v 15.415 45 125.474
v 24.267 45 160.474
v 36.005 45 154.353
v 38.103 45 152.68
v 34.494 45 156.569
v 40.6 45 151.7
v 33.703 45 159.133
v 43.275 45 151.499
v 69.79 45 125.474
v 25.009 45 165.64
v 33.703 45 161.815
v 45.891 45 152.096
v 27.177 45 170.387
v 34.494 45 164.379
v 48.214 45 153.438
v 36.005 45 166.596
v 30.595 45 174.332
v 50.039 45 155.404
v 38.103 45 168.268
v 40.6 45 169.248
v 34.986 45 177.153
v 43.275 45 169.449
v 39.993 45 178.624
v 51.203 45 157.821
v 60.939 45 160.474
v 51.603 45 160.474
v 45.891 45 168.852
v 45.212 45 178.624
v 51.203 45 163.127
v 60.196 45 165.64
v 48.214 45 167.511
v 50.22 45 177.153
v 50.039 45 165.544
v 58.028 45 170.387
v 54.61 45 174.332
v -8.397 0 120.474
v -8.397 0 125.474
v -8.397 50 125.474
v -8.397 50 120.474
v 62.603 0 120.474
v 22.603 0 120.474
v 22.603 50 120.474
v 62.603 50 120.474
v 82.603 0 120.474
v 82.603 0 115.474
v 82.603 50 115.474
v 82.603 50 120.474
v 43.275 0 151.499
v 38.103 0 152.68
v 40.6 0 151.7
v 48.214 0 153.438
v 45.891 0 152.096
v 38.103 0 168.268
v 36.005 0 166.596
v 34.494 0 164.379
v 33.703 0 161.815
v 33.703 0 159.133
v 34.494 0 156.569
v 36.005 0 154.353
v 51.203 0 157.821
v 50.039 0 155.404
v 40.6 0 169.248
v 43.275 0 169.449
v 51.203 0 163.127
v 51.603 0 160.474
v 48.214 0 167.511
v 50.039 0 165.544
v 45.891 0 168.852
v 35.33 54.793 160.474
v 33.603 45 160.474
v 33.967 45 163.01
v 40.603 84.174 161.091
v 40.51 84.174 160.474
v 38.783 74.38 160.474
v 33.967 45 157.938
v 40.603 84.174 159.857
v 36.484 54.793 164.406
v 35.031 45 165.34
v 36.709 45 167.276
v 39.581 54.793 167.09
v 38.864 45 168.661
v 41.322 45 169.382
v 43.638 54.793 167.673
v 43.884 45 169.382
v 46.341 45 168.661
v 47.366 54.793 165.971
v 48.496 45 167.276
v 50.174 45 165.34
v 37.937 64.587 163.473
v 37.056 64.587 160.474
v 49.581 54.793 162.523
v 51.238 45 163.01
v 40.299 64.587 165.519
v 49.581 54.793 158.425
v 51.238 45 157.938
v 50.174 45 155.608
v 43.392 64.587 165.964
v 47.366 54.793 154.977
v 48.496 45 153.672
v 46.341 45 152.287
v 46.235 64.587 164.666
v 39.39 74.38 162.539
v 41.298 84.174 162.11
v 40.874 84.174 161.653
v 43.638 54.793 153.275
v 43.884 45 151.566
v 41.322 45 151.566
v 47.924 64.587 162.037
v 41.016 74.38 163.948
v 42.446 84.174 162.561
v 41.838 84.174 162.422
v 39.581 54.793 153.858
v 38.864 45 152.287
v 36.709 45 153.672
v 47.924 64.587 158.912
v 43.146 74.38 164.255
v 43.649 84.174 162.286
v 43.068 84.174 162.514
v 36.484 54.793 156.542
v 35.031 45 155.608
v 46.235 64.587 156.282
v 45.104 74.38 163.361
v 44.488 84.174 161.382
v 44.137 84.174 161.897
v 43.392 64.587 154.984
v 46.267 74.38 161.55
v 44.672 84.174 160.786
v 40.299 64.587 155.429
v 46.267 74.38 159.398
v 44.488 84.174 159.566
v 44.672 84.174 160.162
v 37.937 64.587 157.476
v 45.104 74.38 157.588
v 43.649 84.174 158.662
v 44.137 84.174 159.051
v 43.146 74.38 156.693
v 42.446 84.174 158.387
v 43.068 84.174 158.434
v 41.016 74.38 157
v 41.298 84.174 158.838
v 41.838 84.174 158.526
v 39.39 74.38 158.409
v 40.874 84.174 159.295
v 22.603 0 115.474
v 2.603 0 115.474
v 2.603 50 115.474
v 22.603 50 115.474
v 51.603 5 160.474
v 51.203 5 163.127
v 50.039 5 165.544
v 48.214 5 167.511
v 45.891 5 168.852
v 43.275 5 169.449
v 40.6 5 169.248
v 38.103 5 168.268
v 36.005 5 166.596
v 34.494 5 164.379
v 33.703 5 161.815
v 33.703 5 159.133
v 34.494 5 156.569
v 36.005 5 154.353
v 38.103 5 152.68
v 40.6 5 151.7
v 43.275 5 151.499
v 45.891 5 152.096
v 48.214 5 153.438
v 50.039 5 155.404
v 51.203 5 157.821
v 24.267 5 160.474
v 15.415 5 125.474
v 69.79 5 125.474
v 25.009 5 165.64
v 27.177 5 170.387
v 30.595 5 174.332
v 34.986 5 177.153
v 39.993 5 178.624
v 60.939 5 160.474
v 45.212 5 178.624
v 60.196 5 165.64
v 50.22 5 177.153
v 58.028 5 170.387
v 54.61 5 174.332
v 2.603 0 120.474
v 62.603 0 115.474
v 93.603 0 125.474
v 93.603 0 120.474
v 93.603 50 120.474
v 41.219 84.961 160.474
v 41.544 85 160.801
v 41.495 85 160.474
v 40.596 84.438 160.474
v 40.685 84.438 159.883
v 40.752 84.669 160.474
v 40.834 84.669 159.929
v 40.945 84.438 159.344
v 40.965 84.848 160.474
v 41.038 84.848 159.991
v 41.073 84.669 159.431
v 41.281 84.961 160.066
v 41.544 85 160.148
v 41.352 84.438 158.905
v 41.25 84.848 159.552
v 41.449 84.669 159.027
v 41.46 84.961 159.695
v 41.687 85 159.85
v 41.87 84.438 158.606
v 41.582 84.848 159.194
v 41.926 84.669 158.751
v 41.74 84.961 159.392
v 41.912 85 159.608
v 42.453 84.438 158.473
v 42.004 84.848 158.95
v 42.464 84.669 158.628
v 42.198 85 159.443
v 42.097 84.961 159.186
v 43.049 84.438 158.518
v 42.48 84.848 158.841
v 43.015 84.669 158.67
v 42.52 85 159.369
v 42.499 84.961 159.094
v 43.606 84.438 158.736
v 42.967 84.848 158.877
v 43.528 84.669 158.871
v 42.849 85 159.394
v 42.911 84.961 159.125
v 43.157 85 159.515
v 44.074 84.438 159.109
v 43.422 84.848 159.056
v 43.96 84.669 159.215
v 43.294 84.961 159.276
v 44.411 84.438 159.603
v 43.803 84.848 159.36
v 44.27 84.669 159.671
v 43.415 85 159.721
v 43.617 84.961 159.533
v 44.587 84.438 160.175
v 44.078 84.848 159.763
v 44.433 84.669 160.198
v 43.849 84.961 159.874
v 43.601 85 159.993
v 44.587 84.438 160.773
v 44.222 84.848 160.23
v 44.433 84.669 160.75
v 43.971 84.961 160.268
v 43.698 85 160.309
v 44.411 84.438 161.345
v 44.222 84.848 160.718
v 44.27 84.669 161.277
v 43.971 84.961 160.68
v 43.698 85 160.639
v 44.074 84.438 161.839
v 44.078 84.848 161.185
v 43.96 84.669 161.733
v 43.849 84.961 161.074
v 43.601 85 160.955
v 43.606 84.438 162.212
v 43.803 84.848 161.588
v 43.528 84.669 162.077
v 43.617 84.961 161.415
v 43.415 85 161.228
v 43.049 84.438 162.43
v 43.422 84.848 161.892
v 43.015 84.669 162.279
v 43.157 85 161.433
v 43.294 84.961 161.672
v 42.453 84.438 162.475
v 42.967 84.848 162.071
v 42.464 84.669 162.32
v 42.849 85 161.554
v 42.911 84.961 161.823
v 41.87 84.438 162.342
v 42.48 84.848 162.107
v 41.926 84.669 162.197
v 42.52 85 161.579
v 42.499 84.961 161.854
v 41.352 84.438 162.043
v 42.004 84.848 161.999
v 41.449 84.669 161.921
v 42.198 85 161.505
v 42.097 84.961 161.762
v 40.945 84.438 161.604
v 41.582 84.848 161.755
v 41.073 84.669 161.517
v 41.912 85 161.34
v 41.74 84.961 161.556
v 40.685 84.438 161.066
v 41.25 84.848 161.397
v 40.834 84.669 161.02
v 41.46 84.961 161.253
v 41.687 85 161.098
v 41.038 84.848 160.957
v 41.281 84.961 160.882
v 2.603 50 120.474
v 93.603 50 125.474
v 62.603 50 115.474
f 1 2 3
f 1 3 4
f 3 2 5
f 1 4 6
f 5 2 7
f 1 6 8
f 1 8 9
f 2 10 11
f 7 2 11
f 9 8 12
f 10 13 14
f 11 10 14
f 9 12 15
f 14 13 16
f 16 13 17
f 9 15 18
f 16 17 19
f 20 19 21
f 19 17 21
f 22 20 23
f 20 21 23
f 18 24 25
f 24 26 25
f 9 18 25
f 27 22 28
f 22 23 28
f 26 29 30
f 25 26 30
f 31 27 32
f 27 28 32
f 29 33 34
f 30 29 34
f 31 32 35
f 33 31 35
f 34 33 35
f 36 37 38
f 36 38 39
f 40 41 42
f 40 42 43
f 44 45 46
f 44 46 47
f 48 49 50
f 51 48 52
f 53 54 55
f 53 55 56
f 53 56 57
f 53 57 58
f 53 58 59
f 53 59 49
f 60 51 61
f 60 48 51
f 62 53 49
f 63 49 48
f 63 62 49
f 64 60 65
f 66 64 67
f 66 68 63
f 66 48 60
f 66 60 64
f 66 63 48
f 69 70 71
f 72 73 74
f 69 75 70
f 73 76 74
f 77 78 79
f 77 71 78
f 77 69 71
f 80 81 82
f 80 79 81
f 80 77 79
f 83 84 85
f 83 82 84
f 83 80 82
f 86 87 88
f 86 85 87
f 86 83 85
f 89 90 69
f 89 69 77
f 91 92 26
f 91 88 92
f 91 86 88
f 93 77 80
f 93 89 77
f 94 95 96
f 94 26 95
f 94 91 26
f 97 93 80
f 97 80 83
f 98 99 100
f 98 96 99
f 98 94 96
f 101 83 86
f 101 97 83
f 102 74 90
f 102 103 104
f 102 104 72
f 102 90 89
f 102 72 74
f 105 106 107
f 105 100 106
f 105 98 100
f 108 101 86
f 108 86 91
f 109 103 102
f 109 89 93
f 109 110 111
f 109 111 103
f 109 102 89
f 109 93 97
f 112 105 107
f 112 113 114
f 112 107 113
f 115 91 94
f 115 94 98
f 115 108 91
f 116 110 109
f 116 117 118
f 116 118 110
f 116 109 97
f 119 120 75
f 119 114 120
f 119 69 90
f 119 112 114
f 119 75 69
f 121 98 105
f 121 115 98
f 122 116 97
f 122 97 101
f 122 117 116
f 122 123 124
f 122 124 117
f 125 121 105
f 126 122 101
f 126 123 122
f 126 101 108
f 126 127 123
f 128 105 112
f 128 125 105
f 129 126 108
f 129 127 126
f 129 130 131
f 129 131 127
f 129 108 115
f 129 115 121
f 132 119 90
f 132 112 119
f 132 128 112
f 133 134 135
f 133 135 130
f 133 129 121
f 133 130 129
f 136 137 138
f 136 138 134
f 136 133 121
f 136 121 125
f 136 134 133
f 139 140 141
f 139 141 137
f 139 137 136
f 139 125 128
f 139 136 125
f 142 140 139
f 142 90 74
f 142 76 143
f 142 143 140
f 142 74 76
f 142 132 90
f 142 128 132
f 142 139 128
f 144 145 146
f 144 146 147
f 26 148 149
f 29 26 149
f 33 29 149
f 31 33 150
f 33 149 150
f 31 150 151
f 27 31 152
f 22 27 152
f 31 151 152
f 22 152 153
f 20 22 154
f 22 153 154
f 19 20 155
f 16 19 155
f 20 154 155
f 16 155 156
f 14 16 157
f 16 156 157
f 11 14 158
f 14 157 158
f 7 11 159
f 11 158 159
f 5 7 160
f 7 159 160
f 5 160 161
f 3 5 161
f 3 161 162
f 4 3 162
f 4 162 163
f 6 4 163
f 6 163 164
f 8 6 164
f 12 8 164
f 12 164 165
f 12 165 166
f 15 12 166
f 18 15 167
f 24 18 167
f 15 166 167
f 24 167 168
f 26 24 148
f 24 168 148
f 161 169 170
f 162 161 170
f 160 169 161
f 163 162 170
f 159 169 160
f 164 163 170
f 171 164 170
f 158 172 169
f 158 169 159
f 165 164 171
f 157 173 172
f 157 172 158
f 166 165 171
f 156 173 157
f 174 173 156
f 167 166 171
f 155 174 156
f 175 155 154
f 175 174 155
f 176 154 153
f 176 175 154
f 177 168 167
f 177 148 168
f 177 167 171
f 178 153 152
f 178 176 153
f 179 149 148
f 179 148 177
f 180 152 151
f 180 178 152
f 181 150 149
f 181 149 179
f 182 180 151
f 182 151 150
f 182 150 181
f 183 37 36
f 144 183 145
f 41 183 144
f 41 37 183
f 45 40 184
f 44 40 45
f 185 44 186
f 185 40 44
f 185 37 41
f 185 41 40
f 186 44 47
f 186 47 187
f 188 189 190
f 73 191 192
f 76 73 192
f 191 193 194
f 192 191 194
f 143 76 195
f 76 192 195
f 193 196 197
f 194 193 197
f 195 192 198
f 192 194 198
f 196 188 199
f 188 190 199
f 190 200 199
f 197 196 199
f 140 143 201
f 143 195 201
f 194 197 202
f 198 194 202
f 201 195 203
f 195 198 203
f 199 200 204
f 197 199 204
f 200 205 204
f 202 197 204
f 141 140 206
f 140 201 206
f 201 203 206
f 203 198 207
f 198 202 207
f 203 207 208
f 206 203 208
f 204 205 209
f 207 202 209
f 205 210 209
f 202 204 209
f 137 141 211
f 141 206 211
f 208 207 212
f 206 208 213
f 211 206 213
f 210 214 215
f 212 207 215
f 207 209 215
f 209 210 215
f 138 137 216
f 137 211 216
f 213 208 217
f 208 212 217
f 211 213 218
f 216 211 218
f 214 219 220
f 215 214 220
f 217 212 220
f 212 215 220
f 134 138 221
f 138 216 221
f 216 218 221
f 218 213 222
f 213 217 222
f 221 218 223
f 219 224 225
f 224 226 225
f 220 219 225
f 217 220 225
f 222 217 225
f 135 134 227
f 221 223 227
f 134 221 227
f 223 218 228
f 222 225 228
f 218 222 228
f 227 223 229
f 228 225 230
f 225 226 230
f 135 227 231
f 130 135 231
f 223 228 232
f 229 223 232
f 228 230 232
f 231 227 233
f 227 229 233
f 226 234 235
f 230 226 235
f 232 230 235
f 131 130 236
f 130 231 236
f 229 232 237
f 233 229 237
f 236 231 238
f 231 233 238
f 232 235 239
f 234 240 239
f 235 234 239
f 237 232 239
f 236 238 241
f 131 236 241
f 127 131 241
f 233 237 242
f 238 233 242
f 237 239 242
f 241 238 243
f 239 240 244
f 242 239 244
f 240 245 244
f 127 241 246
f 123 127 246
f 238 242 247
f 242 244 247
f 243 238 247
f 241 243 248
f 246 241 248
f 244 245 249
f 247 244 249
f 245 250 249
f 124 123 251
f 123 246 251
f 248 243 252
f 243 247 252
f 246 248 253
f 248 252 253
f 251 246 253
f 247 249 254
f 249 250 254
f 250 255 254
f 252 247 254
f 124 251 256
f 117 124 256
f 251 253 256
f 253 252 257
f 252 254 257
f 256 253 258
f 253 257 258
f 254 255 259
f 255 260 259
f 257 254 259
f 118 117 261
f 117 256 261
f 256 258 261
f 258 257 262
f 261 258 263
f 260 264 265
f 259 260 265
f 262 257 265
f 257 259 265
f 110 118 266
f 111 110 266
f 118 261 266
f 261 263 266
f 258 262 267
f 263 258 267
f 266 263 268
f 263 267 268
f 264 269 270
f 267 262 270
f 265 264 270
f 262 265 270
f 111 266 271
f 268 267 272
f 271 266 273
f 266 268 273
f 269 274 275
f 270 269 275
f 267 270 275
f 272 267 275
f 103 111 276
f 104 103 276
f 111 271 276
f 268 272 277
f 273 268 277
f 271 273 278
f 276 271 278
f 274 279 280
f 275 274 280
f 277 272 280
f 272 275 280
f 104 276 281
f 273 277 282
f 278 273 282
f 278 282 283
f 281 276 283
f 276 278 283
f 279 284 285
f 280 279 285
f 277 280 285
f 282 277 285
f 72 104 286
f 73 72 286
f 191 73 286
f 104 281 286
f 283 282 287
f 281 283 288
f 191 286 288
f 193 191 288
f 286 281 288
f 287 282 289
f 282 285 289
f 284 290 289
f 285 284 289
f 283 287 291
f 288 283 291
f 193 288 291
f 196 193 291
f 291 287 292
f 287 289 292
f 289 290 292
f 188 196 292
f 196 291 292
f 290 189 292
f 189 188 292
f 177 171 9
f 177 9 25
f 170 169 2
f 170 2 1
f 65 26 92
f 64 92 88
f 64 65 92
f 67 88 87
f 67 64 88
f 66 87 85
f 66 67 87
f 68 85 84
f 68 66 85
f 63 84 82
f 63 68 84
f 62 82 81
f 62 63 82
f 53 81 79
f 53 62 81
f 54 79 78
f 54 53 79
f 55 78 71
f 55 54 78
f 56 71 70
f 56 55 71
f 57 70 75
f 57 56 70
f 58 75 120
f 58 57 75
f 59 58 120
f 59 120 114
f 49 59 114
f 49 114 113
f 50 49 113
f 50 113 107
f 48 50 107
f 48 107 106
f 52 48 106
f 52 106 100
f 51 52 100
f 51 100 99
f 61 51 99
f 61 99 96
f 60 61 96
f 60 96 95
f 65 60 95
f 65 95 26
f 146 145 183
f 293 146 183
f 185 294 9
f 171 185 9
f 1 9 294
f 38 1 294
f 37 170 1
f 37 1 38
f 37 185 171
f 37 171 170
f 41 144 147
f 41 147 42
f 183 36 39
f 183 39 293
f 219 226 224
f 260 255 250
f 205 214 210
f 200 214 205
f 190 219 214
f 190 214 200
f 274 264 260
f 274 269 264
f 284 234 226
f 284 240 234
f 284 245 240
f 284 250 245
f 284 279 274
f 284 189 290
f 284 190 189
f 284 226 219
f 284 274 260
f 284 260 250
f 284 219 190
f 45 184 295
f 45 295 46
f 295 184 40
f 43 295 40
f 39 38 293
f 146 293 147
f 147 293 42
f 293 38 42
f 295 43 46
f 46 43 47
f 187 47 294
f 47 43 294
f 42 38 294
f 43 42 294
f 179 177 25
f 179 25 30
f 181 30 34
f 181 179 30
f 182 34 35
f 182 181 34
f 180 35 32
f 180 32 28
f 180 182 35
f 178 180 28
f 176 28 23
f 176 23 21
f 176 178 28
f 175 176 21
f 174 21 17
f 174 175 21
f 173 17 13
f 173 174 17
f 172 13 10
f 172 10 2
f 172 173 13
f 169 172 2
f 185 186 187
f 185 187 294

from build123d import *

# Parameters (mm, degrees)
F0_W      = 20
F0_H      = 5
F1_DEPTH  = 50
F2_START  = -5
F0_R      = 9
F2_DEPTH  = 40
F3_DEPTH  = 45
F3_FACE_R = 9
F4_DEPTH  = 40
F4_TAPER  = 10
F5_R      = 1


with BuildPart() as f1:
    # F0 (on Front) → F1 (new body)
    with BuildSketch(Plane.XZ):
        Polygon((-8.3973156512, 120.4740846279), (2.6026843488, 120.4740846279), (22.6026843488, 120.4740846279), (62.6026843488, 120.4740846279), (82.6026843488, 120.4740846279), (93.6026843488, 120.4740846279), (93.6026843488, 125.4740846279), (69.7901826352, 125.4740846279), (15.4151860625, 125.4740846279), (-8.3973156512, 125.4740846279), align=None)
        with Locations((12.6026843488, 117.9740846279)):
            Rectangle(F0_W, F0_H)
        with Locations((72.6026843488, 117.9740846279)):
            Rectangle(F0_W, F0_H)
    extrude(amount=-F1_DEPTH)

    # F0 (on Front) → F2 (join)
    with BuildSketch(Plane.XZ.offset(F2_START)):
        with BuildLine():
            Line((24.2665670812, 160.4740846279), (15.4151860625, 125.4740846279))
            Line((15.4151860625, 125.4740846279), (69.7901826352, 125.4740846279))
            Line((69.7901826352, 125.4740846279), (60.9388016164, 160.4740846279))
            ThreePointArc((60.9388016164, 160.4740846279), (42.6026843488, 178.8102018955), (24.2665670812, 160.4740846279))
        make_face()
        with Locations((42.6026843488, 160.4740846279)):
            Circle(F0_R, mode=Mode.SUBTRACT)
    extrude(amount=-F2_DEPTH)


with BuildPart() as f3:
    # F0 (on Front) → F3 (new body, through all)
    with BuildSketch(Plane.XZ):
        with Locations((42.6026843488, 160.4740846279)):
            Circle(F0_R)
    extrude(amount=-F3_DEPTH)

    # F3_face (on face) → F4 (join)
    with BuildSketch(Plane(origin=(42.6026843488, 45, 160.4740846279), x_dir=(-1, 0, 0), z_dir=(0, 1, 0))):
        Circle(F3_FACE_R)
    extrude(amount=F4_DEPTH, taper=F4_TAPER)

    # F5
    f5_edges = [f3.edges().sort_by_distance(p)[0] for p in [
        (44.549605, 85, 160.474085),
    ]]
    fillet(f5_edges, radius=F5_R)


solid = Compound([f1.part, f3.part])
